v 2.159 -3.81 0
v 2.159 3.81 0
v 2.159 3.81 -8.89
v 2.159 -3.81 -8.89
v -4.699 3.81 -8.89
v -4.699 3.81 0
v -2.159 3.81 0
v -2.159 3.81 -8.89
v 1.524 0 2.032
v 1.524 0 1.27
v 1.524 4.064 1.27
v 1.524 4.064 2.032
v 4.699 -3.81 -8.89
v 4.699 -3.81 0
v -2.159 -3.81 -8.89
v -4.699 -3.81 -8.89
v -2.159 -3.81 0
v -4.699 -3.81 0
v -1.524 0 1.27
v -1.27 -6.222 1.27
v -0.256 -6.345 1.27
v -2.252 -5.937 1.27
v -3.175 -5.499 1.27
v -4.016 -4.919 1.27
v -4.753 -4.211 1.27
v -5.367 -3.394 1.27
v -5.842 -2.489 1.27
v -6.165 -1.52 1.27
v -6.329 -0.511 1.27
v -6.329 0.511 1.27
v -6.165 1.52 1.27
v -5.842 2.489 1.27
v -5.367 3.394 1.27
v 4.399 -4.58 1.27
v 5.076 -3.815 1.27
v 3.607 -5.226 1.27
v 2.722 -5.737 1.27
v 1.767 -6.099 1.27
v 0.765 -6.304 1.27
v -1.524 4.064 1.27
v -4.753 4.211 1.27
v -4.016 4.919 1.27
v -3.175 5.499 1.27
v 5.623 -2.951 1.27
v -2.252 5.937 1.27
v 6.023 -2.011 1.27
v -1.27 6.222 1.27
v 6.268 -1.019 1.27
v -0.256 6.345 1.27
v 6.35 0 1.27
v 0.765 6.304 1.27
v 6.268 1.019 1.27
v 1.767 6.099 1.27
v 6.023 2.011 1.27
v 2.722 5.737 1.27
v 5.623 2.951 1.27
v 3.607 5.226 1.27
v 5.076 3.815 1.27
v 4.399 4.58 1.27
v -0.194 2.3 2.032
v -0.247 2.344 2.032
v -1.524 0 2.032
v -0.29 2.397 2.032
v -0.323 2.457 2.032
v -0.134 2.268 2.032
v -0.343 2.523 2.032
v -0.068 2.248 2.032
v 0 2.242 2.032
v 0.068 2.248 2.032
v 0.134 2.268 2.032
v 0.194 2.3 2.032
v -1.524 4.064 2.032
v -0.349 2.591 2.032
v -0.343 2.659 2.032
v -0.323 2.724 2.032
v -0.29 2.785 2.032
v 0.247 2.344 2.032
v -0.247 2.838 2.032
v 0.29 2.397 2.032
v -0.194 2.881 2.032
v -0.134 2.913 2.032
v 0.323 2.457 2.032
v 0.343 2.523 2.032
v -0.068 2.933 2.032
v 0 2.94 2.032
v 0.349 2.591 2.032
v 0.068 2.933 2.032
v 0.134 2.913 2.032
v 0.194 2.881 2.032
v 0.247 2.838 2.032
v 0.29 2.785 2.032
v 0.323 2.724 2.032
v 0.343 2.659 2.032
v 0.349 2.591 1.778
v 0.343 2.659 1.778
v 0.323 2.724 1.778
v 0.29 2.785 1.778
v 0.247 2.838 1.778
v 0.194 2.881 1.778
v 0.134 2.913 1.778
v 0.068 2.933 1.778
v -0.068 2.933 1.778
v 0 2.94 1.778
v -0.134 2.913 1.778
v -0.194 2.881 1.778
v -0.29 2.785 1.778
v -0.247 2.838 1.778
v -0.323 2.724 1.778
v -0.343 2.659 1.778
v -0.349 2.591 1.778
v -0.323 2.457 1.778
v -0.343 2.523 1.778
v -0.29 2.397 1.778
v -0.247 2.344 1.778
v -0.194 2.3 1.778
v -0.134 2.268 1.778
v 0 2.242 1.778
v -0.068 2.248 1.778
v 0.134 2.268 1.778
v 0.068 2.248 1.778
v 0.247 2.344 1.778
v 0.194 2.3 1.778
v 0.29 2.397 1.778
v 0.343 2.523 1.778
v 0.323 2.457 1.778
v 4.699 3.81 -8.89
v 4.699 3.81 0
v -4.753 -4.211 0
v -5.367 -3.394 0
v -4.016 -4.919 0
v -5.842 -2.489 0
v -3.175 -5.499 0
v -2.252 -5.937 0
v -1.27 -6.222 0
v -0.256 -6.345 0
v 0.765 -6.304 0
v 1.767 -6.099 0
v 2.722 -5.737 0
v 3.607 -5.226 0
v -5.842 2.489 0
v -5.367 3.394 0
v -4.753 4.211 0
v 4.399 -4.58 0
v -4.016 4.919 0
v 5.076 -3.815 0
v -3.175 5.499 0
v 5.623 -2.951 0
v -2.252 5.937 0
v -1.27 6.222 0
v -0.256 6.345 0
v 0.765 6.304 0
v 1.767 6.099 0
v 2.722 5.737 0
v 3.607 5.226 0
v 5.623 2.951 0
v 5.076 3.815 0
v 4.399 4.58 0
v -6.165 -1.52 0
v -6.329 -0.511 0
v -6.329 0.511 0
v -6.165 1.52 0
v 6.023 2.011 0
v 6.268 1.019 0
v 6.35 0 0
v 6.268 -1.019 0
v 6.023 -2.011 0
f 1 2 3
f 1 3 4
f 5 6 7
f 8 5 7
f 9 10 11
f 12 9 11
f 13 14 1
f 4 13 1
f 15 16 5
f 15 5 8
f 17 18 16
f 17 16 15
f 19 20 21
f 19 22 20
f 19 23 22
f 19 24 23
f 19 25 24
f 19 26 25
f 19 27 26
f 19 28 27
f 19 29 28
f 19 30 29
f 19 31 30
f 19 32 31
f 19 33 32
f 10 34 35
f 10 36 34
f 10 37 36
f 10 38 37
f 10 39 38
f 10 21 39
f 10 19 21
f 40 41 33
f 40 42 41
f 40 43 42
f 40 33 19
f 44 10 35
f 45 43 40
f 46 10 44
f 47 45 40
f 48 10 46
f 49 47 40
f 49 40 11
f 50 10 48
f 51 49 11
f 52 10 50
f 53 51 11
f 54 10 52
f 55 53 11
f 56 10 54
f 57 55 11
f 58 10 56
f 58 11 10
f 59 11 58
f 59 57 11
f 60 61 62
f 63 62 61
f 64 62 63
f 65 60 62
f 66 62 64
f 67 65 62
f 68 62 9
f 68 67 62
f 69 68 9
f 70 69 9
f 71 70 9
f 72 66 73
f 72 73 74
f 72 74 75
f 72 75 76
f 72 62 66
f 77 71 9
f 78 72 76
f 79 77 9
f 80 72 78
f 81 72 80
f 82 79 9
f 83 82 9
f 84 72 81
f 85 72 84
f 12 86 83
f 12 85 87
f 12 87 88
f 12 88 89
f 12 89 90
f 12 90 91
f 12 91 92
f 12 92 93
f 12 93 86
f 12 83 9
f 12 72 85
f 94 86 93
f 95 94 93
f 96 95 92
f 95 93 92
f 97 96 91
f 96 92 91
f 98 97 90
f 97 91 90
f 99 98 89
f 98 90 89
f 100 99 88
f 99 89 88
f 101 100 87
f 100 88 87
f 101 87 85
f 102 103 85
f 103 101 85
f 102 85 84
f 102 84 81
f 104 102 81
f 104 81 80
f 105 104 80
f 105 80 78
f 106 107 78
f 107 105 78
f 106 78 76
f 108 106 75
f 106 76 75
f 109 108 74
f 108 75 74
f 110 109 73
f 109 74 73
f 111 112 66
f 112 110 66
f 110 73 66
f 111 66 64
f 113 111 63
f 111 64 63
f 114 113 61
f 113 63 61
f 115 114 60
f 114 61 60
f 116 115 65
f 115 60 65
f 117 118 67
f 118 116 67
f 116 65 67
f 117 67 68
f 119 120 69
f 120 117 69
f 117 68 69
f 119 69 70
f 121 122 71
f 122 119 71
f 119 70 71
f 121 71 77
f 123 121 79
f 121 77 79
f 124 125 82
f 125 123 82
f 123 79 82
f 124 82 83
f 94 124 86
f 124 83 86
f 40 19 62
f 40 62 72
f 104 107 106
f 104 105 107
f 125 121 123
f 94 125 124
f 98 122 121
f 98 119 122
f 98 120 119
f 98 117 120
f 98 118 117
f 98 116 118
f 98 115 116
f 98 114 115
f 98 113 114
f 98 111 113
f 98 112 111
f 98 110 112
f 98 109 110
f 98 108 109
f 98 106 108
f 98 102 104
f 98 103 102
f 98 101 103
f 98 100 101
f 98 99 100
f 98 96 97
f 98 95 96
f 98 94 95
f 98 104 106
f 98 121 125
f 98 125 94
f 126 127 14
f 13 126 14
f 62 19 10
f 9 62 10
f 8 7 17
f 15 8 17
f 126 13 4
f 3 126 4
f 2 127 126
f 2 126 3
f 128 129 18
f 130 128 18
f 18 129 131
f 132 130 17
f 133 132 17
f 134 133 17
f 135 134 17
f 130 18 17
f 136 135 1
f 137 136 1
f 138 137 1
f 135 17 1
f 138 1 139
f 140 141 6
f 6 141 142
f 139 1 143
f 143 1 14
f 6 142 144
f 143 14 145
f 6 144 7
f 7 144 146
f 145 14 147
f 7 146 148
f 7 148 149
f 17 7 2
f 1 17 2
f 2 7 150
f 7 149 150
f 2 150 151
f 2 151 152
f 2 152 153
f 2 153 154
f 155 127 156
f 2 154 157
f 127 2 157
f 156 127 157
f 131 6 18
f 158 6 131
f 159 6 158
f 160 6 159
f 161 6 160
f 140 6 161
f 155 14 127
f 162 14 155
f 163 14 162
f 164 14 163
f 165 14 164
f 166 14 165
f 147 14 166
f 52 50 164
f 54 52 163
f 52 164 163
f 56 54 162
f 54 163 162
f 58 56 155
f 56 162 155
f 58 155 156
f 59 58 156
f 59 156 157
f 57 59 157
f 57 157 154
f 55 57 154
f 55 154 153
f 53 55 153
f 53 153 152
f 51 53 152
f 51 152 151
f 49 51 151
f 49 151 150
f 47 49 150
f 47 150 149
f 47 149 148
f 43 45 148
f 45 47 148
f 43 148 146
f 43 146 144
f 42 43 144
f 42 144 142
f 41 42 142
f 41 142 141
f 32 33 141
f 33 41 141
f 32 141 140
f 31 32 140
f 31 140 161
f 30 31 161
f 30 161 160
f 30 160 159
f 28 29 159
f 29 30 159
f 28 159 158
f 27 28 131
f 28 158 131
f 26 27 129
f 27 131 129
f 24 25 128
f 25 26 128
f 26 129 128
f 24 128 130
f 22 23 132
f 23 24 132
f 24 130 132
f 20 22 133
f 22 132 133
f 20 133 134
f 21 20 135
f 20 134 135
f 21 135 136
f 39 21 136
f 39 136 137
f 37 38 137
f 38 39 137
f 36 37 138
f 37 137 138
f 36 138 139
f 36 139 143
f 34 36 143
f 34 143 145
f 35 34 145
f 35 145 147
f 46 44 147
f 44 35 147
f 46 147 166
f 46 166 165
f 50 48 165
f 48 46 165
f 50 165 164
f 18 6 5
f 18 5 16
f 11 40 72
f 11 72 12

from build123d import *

# Parameters (mm, degrees)
F0_R     = 6.35
F1_DEPTH = 1.27
F2_W     = 3.048
F2_H     = 4.064
F3_DEPTH = 0.762
F4_R     = 0.34925
F5_DEPTH = 0.254
F6_W     = 2.54
F6_H     = 7.62
F7_DEPTH = 8.89


with BuildPart() as f1:
    # F0 (on Top) → F1 (new body)
    with BuildSketch(Plane.XY):
        Circle(F0_R)
    extrude(amount=F1_DEPTH)

    # F2 (on face) → F3 (join)
    with BuildSketch(Plane.XY.offset(1.27)):
        with Locations((0, 2.032)):
            Rectangle(F2_W, F2_H)
    extrude(amount=F3_DEPTH)

    # F4 (on face) → F5 (cut)
    with BuildSketch(Plane.XY.offset(2.032)):
        with Locations((0, 2.5908)):
            Circle(F4_R)
    extrude(amount=-F5_DEPTH, mode=Mode.SUBTRACT)

    # F6 (on face) → F7 (join)
    with BuildSketch(Plane(origin=(0, 0, 0), x_dir=(1, 0, 0), z_dir=(0, 0, -1))):
        with Locations((-3.429, 0)):
            Rectangle(F6_W, F6_H)
    extrude(amount=F7_DEPTH)

    # F8: F1 across plane


with BuildPart() as f1_1:
    add(f1.part)
    add(f1.part.mirror(Plane.YZ))


solid = f1_1.part
